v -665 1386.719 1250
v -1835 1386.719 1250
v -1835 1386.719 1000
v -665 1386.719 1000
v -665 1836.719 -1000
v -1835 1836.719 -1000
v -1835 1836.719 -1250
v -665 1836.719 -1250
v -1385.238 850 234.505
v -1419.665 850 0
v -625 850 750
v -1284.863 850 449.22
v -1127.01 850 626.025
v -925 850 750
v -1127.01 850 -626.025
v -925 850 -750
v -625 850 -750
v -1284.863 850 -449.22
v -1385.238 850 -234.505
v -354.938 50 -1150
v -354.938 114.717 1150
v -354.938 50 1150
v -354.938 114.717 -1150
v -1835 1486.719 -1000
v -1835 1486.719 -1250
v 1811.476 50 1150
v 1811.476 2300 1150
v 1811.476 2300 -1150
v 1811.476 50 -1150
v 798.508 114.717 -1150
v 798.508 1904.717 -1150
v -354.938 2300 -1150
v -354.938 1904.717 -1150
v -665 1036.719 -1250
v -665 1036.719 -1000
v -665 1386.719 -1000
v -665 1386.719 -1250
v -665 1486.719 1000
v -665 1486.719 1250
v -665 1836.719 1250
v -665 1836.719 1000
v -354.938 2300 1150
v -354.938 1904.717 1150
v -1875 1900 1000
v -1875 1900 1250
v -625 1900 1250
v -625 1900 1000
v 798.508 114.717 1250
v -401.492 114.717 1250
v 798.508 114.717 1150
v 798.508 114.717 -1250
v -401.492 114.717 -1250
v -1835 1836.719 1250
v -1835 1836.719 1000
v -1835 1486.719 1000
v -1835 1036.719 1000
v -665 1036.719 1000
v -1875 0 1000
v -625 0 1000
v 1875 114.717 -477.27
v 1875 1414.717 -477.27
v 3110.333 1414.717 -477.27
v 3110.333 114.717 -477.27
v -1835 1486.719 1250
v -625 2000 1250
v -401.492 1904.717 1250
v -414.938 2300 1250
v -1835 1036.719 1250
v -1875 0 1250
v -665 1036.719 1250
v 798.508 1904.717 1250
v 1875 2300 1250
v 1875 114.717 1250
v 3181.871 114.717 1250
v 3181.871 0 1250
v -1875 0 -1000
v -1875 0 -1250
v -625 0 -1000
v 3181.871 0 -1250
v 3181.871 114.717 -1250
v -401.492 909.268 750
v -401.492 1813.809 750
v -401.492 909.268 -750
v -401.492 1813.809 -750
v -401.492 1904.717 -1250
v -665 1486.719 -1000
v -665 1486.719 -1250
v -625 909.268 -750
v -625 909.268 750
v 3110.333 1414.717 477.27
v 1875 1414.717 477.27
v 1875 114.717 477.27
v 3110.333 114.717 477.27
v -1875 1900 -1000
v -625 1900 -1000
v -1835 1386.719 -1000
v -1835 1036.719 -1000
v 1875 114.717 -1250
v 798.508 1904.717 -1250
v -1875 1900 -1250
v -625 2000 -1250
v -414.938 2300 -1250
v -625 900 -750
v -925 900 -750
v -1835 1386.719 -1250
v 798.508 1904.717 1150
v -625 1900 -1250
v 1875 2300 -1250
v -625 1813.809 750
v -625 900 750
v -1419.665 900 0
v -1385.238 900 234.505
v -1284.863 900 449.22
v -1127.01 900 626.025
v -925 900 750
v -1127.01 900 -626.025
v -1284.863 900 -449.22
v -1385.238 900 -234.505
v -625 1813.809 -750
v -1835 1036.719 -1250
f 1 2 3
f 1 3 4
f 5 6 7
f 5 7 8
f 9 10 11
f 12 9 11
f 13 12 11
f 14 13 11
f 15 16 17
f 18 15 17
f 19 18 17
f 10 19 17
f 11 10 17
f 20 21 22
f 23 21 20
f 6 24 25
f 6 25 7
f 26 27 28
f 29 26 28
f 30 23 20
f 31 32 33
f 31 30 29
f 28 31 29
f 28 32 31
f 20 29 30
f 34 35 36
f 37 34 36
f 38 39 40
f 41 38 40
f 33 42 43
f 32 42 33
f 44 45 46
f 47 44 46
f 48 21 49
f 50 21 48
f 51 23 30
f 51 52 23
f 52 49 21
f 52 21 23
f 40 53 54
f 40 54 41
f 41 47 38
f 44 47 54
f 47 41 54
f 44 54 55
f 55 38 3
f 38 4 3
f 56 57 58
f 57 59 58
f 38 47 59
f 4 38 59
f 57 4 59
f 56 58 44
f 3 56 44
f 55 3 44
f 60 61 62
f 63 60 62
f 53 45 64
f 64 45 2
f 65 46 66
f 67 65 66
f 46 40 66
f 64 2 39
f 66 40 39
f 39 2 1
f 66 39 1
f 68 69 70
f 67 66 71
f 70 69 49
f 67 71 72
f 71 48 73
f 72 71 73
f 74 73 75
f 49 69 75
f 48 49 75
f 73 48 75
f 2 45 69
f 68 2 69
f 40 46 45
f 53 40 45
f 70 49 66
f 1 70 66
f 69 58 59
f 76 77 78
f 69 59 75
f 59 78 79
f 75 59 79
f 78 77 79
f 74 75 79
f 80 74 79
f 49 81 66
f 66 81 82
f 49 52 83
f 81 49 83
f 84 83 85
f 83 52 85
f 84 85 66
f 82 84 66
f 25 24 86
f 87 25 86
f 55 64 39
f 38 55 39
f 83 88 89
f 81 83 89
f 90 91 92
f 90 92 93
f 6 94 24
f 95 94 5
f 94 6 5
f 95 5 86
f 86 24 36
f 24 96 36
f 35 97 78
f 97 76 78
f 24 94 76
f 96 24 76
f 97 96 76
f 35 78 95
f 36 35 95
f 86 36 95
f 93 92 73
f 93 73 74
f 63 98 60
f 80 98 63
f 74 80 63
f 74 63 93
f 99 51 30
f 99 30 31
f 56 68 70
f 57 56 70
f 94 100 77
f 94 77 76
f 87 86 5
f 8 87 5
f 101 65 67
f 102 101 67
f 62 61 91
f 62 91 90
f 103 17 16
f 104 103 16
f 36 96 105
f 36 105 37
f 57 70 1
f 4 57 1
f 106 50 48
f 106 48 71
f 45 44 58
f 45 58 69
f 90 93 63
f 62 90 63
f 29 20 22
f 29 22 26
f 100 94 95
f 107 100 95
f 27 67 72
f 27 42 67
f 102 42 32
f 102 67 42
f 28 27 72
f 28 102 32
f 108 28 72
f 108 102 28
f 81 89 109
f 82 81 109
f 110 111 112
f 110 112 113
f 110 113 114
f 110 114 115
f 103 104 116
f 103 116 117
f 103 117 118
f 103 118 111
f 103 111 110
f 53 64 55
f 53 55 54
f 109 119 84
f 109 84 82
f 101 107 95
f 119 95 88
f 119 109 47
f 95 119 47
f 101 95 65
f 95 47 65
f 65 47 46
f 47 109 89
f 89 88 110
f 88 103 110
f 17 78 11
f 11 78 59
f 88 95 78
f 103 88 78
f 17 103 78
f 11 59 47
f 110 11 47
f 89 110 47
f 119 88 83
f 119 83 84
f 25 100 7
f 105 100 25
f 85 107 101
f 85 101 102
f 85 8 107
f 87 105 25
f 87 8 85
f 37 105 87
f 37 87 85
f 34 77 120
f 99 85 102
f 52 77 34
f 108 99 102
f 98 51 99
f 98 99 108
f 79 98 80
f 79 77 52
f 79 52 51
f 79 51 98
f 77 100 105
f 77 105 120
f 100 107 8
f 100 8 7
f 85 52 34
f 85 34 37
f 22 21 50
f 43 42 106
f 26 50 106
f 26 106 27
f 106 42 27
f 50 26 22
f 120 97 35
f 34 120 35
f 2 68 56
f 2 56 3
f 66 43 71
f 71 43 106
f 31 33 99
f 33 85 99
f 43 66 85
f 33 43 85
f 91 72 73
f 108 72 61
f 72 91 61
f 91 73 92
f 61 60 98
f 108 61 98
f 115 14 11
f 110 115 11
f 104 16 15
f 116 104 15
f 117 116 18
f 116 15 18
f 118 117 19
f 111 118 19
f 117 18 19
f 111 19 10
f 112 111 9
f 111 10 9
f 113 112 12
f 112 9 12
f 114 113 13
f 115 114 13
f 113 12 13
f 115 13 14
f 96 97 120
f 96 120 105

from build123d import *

# Parameters (mm, degrees)
SALIENTE_EXTRUIR1_DEPTH = 2300
CROQUIS2_W              = 1250
CROQUIS2_H              = 400
CORTAR_EXTRUIR1_DEPTH   = 2500
CORTAR_EXTRUIR2_DEPTH   = 2500
CROQUIS4_W              = 2166.414041003
CROQUIS4_H              = 2300
CORTAR_EXTRUIR3_DEPTH   = 2250
CROQUIS5_W              = 1170
CROQUIS5_H              = 350
CORTAR_EXTRUIR4_DEPTH   = 2500
MATRIZL1_COUNT          = 2
MATRIZL1_PITCH          = 450
CORTAR_EXTRUIR5_START   = -2500
CROQUIS7_W              = 1200
CROQUIS7_H              = 1790
CORTAR_EXTRUIR5_DEPTH   = 2500
CROQUIS8_W              = 1306.870998869
CROQUIS8_H              = 2500
SALIENTE_EXTRUIR2_DEPTH = 114.717432506
CROQUIS9_W              = 1235.333437109
CROQUIS9_H              = 954.540118574
SALIENTE_EXTRUIR3_DEPTH = 1300
SALIENTE_EXTRUIR4_DEPTH = 50
CROQUIS11_W             = 1500
CROQUIS11_H             = 904.540044025
CORTAR_EXTRUIR6_DEPTH   = 223.508326288


with BuildPart() as part:
    # Croquis1 → Saliente-Extruir1 (new body)
    with BuildSketch(Plane(origin=(0, 0, 0), x_dir=(1, 0, 0), z_dir=(0, 1, 0))):
        Polygon((-1875, 1000), (-625, 1000), (-625, -1000), (-1875, -1000), (-1875, -1250), (1875, -1250), (1875, 1250), (-1875, 1250), align=None)
    extrude(amount=SALIENTE_EXTRUIR1_DEPTH)

    # Croquis2 → Cortar-Extruir1 (cut)
    with BuildSketch(Plane.XY.offset(1250)):
        with Locations((-1250, 2100)):
            Rectangle(CROQUIS2_W, CROQUIS2_H)
    extrude(amount=-CORTAR_EXTRUIR1_DEPTH, mode=Mode.SUBTRACT)

    # Croquis3 → Cortar-Extruir2 (cut)
    with BuildSketch(Plane.XY.offset(1250)):
        Polygon((-625, 2000), (-414.937738537, 2300), (-625, 2300), align=None)
    extrude(amount=-CORTAR_EXTRUIR2_DEPTH, mode=Mode.SUBTRACT)

    # Croquis4 → Cortar-Extruir3 (cut)
    with BuildSketch(Plane(origin=(0, 2300, 0), x_dir=(1, 0, 0), z_dir=(0, 1, 0))):
        with Locations((728.269281965, 0)):
            Rectangle(CROQUIS4_W, CROQUIS4_H)
    extrude(amount=-CORTAR_EXTRUIR3_DEPTH, mode=Mode.SUBTRACT)

    # Croquis5 → Cortar-Extruir4 (cut)
    with BuildSketch(Plane.XY.offset(1250)):
        with Locations((-1250, 1661.719484632)):
            Rectangle(CROQUIS5_W, CROQUIS5_H)
    cortar_extruir4 = extrude(amount=-CORTAR_EXTRUIR4_DEPTH, mode=Mode.SUBTRACT)

    # MatrizL1: Cortar-Extruir4 ×2
    with Locations(*[(0, -i * MATRIZL1_PITCH, 0) for i in range(1, MATRIZL1_COUNT)]):
        add(cortar_extruir4, mode=Mode.SUBTRACT)

    # Croquis7 → Cortar-Extruir5 (cut)
    with BuildSketch(Plane.XY.offset(1250).offset(CORTAR_EXTRUIR5_START)):
        with Locations((198.508326288, 1009.717432506)):
            Rectangle(CROQUIS7_W, CROQUIS7_H)
    extrude(amount=CORTAR_EXTRUIR5_DEPTH, mode=Mode.SUBTRACT)

    # Croquis8 → Saliente-Extruir2 (add)
    with BuildSketch(Plane(origin=(0, 0, 0), x_dir=(1, 0, 0), z_dir=(0, 1, 0))):
        with Locations((2528.435499435, 0)):
            Rectangle(CROQUIS8_W, CROQUIS8_H)
    extrude(amount=SALIENTE_EXTRUIR2_DEPTH)

    # Croquis9 → Saliente-Extruir3 (add)
    with BuildSketch(Plane(origin=(0, 114.717432506, 0), x_dir=(1, 0, 0), z_dir=(0, 1, 0))):
        with Locations((2492.666718555, 0)):
            Rectangle(CROQUIS9_W, CROQUIS9_H)
    extrude(amount=SALIENTE_EXTRUIR3_DEPTH)

    # Croquis10 → Saliente-Extruir4 (add)
    with BuildSketch(Plane(origin=(0, 850, 0), x_dir=(1, 0, 0), z_dir=(0, 1, 0))):
        with BuildLine():
            Line((-625, 750), (-925, 750))
            ThreePointArc((-925, 750), (-1419.665058633, 0), (-925, -750))
            Line((-925, -750), (-625, -750))
            Line((-625, -750), (-625, 750))
        make_face()
    extrude(amount=SALIENTE_EXTRUIR4_DEPTH)

    # Croquis11 → Cortar-Extruir6 (cut)
    with BuildSketch(Plane.ZY.offset(625)):
        with Locations((0, 1361.538512049)):
            Rectangle(CROQUIS11_W, CROQUIS11_H)
    extrude(amount=-CORTAR_EXTRUIR6_DEPTH, mode=Mode.SUBTRACT)


solid = part.part
